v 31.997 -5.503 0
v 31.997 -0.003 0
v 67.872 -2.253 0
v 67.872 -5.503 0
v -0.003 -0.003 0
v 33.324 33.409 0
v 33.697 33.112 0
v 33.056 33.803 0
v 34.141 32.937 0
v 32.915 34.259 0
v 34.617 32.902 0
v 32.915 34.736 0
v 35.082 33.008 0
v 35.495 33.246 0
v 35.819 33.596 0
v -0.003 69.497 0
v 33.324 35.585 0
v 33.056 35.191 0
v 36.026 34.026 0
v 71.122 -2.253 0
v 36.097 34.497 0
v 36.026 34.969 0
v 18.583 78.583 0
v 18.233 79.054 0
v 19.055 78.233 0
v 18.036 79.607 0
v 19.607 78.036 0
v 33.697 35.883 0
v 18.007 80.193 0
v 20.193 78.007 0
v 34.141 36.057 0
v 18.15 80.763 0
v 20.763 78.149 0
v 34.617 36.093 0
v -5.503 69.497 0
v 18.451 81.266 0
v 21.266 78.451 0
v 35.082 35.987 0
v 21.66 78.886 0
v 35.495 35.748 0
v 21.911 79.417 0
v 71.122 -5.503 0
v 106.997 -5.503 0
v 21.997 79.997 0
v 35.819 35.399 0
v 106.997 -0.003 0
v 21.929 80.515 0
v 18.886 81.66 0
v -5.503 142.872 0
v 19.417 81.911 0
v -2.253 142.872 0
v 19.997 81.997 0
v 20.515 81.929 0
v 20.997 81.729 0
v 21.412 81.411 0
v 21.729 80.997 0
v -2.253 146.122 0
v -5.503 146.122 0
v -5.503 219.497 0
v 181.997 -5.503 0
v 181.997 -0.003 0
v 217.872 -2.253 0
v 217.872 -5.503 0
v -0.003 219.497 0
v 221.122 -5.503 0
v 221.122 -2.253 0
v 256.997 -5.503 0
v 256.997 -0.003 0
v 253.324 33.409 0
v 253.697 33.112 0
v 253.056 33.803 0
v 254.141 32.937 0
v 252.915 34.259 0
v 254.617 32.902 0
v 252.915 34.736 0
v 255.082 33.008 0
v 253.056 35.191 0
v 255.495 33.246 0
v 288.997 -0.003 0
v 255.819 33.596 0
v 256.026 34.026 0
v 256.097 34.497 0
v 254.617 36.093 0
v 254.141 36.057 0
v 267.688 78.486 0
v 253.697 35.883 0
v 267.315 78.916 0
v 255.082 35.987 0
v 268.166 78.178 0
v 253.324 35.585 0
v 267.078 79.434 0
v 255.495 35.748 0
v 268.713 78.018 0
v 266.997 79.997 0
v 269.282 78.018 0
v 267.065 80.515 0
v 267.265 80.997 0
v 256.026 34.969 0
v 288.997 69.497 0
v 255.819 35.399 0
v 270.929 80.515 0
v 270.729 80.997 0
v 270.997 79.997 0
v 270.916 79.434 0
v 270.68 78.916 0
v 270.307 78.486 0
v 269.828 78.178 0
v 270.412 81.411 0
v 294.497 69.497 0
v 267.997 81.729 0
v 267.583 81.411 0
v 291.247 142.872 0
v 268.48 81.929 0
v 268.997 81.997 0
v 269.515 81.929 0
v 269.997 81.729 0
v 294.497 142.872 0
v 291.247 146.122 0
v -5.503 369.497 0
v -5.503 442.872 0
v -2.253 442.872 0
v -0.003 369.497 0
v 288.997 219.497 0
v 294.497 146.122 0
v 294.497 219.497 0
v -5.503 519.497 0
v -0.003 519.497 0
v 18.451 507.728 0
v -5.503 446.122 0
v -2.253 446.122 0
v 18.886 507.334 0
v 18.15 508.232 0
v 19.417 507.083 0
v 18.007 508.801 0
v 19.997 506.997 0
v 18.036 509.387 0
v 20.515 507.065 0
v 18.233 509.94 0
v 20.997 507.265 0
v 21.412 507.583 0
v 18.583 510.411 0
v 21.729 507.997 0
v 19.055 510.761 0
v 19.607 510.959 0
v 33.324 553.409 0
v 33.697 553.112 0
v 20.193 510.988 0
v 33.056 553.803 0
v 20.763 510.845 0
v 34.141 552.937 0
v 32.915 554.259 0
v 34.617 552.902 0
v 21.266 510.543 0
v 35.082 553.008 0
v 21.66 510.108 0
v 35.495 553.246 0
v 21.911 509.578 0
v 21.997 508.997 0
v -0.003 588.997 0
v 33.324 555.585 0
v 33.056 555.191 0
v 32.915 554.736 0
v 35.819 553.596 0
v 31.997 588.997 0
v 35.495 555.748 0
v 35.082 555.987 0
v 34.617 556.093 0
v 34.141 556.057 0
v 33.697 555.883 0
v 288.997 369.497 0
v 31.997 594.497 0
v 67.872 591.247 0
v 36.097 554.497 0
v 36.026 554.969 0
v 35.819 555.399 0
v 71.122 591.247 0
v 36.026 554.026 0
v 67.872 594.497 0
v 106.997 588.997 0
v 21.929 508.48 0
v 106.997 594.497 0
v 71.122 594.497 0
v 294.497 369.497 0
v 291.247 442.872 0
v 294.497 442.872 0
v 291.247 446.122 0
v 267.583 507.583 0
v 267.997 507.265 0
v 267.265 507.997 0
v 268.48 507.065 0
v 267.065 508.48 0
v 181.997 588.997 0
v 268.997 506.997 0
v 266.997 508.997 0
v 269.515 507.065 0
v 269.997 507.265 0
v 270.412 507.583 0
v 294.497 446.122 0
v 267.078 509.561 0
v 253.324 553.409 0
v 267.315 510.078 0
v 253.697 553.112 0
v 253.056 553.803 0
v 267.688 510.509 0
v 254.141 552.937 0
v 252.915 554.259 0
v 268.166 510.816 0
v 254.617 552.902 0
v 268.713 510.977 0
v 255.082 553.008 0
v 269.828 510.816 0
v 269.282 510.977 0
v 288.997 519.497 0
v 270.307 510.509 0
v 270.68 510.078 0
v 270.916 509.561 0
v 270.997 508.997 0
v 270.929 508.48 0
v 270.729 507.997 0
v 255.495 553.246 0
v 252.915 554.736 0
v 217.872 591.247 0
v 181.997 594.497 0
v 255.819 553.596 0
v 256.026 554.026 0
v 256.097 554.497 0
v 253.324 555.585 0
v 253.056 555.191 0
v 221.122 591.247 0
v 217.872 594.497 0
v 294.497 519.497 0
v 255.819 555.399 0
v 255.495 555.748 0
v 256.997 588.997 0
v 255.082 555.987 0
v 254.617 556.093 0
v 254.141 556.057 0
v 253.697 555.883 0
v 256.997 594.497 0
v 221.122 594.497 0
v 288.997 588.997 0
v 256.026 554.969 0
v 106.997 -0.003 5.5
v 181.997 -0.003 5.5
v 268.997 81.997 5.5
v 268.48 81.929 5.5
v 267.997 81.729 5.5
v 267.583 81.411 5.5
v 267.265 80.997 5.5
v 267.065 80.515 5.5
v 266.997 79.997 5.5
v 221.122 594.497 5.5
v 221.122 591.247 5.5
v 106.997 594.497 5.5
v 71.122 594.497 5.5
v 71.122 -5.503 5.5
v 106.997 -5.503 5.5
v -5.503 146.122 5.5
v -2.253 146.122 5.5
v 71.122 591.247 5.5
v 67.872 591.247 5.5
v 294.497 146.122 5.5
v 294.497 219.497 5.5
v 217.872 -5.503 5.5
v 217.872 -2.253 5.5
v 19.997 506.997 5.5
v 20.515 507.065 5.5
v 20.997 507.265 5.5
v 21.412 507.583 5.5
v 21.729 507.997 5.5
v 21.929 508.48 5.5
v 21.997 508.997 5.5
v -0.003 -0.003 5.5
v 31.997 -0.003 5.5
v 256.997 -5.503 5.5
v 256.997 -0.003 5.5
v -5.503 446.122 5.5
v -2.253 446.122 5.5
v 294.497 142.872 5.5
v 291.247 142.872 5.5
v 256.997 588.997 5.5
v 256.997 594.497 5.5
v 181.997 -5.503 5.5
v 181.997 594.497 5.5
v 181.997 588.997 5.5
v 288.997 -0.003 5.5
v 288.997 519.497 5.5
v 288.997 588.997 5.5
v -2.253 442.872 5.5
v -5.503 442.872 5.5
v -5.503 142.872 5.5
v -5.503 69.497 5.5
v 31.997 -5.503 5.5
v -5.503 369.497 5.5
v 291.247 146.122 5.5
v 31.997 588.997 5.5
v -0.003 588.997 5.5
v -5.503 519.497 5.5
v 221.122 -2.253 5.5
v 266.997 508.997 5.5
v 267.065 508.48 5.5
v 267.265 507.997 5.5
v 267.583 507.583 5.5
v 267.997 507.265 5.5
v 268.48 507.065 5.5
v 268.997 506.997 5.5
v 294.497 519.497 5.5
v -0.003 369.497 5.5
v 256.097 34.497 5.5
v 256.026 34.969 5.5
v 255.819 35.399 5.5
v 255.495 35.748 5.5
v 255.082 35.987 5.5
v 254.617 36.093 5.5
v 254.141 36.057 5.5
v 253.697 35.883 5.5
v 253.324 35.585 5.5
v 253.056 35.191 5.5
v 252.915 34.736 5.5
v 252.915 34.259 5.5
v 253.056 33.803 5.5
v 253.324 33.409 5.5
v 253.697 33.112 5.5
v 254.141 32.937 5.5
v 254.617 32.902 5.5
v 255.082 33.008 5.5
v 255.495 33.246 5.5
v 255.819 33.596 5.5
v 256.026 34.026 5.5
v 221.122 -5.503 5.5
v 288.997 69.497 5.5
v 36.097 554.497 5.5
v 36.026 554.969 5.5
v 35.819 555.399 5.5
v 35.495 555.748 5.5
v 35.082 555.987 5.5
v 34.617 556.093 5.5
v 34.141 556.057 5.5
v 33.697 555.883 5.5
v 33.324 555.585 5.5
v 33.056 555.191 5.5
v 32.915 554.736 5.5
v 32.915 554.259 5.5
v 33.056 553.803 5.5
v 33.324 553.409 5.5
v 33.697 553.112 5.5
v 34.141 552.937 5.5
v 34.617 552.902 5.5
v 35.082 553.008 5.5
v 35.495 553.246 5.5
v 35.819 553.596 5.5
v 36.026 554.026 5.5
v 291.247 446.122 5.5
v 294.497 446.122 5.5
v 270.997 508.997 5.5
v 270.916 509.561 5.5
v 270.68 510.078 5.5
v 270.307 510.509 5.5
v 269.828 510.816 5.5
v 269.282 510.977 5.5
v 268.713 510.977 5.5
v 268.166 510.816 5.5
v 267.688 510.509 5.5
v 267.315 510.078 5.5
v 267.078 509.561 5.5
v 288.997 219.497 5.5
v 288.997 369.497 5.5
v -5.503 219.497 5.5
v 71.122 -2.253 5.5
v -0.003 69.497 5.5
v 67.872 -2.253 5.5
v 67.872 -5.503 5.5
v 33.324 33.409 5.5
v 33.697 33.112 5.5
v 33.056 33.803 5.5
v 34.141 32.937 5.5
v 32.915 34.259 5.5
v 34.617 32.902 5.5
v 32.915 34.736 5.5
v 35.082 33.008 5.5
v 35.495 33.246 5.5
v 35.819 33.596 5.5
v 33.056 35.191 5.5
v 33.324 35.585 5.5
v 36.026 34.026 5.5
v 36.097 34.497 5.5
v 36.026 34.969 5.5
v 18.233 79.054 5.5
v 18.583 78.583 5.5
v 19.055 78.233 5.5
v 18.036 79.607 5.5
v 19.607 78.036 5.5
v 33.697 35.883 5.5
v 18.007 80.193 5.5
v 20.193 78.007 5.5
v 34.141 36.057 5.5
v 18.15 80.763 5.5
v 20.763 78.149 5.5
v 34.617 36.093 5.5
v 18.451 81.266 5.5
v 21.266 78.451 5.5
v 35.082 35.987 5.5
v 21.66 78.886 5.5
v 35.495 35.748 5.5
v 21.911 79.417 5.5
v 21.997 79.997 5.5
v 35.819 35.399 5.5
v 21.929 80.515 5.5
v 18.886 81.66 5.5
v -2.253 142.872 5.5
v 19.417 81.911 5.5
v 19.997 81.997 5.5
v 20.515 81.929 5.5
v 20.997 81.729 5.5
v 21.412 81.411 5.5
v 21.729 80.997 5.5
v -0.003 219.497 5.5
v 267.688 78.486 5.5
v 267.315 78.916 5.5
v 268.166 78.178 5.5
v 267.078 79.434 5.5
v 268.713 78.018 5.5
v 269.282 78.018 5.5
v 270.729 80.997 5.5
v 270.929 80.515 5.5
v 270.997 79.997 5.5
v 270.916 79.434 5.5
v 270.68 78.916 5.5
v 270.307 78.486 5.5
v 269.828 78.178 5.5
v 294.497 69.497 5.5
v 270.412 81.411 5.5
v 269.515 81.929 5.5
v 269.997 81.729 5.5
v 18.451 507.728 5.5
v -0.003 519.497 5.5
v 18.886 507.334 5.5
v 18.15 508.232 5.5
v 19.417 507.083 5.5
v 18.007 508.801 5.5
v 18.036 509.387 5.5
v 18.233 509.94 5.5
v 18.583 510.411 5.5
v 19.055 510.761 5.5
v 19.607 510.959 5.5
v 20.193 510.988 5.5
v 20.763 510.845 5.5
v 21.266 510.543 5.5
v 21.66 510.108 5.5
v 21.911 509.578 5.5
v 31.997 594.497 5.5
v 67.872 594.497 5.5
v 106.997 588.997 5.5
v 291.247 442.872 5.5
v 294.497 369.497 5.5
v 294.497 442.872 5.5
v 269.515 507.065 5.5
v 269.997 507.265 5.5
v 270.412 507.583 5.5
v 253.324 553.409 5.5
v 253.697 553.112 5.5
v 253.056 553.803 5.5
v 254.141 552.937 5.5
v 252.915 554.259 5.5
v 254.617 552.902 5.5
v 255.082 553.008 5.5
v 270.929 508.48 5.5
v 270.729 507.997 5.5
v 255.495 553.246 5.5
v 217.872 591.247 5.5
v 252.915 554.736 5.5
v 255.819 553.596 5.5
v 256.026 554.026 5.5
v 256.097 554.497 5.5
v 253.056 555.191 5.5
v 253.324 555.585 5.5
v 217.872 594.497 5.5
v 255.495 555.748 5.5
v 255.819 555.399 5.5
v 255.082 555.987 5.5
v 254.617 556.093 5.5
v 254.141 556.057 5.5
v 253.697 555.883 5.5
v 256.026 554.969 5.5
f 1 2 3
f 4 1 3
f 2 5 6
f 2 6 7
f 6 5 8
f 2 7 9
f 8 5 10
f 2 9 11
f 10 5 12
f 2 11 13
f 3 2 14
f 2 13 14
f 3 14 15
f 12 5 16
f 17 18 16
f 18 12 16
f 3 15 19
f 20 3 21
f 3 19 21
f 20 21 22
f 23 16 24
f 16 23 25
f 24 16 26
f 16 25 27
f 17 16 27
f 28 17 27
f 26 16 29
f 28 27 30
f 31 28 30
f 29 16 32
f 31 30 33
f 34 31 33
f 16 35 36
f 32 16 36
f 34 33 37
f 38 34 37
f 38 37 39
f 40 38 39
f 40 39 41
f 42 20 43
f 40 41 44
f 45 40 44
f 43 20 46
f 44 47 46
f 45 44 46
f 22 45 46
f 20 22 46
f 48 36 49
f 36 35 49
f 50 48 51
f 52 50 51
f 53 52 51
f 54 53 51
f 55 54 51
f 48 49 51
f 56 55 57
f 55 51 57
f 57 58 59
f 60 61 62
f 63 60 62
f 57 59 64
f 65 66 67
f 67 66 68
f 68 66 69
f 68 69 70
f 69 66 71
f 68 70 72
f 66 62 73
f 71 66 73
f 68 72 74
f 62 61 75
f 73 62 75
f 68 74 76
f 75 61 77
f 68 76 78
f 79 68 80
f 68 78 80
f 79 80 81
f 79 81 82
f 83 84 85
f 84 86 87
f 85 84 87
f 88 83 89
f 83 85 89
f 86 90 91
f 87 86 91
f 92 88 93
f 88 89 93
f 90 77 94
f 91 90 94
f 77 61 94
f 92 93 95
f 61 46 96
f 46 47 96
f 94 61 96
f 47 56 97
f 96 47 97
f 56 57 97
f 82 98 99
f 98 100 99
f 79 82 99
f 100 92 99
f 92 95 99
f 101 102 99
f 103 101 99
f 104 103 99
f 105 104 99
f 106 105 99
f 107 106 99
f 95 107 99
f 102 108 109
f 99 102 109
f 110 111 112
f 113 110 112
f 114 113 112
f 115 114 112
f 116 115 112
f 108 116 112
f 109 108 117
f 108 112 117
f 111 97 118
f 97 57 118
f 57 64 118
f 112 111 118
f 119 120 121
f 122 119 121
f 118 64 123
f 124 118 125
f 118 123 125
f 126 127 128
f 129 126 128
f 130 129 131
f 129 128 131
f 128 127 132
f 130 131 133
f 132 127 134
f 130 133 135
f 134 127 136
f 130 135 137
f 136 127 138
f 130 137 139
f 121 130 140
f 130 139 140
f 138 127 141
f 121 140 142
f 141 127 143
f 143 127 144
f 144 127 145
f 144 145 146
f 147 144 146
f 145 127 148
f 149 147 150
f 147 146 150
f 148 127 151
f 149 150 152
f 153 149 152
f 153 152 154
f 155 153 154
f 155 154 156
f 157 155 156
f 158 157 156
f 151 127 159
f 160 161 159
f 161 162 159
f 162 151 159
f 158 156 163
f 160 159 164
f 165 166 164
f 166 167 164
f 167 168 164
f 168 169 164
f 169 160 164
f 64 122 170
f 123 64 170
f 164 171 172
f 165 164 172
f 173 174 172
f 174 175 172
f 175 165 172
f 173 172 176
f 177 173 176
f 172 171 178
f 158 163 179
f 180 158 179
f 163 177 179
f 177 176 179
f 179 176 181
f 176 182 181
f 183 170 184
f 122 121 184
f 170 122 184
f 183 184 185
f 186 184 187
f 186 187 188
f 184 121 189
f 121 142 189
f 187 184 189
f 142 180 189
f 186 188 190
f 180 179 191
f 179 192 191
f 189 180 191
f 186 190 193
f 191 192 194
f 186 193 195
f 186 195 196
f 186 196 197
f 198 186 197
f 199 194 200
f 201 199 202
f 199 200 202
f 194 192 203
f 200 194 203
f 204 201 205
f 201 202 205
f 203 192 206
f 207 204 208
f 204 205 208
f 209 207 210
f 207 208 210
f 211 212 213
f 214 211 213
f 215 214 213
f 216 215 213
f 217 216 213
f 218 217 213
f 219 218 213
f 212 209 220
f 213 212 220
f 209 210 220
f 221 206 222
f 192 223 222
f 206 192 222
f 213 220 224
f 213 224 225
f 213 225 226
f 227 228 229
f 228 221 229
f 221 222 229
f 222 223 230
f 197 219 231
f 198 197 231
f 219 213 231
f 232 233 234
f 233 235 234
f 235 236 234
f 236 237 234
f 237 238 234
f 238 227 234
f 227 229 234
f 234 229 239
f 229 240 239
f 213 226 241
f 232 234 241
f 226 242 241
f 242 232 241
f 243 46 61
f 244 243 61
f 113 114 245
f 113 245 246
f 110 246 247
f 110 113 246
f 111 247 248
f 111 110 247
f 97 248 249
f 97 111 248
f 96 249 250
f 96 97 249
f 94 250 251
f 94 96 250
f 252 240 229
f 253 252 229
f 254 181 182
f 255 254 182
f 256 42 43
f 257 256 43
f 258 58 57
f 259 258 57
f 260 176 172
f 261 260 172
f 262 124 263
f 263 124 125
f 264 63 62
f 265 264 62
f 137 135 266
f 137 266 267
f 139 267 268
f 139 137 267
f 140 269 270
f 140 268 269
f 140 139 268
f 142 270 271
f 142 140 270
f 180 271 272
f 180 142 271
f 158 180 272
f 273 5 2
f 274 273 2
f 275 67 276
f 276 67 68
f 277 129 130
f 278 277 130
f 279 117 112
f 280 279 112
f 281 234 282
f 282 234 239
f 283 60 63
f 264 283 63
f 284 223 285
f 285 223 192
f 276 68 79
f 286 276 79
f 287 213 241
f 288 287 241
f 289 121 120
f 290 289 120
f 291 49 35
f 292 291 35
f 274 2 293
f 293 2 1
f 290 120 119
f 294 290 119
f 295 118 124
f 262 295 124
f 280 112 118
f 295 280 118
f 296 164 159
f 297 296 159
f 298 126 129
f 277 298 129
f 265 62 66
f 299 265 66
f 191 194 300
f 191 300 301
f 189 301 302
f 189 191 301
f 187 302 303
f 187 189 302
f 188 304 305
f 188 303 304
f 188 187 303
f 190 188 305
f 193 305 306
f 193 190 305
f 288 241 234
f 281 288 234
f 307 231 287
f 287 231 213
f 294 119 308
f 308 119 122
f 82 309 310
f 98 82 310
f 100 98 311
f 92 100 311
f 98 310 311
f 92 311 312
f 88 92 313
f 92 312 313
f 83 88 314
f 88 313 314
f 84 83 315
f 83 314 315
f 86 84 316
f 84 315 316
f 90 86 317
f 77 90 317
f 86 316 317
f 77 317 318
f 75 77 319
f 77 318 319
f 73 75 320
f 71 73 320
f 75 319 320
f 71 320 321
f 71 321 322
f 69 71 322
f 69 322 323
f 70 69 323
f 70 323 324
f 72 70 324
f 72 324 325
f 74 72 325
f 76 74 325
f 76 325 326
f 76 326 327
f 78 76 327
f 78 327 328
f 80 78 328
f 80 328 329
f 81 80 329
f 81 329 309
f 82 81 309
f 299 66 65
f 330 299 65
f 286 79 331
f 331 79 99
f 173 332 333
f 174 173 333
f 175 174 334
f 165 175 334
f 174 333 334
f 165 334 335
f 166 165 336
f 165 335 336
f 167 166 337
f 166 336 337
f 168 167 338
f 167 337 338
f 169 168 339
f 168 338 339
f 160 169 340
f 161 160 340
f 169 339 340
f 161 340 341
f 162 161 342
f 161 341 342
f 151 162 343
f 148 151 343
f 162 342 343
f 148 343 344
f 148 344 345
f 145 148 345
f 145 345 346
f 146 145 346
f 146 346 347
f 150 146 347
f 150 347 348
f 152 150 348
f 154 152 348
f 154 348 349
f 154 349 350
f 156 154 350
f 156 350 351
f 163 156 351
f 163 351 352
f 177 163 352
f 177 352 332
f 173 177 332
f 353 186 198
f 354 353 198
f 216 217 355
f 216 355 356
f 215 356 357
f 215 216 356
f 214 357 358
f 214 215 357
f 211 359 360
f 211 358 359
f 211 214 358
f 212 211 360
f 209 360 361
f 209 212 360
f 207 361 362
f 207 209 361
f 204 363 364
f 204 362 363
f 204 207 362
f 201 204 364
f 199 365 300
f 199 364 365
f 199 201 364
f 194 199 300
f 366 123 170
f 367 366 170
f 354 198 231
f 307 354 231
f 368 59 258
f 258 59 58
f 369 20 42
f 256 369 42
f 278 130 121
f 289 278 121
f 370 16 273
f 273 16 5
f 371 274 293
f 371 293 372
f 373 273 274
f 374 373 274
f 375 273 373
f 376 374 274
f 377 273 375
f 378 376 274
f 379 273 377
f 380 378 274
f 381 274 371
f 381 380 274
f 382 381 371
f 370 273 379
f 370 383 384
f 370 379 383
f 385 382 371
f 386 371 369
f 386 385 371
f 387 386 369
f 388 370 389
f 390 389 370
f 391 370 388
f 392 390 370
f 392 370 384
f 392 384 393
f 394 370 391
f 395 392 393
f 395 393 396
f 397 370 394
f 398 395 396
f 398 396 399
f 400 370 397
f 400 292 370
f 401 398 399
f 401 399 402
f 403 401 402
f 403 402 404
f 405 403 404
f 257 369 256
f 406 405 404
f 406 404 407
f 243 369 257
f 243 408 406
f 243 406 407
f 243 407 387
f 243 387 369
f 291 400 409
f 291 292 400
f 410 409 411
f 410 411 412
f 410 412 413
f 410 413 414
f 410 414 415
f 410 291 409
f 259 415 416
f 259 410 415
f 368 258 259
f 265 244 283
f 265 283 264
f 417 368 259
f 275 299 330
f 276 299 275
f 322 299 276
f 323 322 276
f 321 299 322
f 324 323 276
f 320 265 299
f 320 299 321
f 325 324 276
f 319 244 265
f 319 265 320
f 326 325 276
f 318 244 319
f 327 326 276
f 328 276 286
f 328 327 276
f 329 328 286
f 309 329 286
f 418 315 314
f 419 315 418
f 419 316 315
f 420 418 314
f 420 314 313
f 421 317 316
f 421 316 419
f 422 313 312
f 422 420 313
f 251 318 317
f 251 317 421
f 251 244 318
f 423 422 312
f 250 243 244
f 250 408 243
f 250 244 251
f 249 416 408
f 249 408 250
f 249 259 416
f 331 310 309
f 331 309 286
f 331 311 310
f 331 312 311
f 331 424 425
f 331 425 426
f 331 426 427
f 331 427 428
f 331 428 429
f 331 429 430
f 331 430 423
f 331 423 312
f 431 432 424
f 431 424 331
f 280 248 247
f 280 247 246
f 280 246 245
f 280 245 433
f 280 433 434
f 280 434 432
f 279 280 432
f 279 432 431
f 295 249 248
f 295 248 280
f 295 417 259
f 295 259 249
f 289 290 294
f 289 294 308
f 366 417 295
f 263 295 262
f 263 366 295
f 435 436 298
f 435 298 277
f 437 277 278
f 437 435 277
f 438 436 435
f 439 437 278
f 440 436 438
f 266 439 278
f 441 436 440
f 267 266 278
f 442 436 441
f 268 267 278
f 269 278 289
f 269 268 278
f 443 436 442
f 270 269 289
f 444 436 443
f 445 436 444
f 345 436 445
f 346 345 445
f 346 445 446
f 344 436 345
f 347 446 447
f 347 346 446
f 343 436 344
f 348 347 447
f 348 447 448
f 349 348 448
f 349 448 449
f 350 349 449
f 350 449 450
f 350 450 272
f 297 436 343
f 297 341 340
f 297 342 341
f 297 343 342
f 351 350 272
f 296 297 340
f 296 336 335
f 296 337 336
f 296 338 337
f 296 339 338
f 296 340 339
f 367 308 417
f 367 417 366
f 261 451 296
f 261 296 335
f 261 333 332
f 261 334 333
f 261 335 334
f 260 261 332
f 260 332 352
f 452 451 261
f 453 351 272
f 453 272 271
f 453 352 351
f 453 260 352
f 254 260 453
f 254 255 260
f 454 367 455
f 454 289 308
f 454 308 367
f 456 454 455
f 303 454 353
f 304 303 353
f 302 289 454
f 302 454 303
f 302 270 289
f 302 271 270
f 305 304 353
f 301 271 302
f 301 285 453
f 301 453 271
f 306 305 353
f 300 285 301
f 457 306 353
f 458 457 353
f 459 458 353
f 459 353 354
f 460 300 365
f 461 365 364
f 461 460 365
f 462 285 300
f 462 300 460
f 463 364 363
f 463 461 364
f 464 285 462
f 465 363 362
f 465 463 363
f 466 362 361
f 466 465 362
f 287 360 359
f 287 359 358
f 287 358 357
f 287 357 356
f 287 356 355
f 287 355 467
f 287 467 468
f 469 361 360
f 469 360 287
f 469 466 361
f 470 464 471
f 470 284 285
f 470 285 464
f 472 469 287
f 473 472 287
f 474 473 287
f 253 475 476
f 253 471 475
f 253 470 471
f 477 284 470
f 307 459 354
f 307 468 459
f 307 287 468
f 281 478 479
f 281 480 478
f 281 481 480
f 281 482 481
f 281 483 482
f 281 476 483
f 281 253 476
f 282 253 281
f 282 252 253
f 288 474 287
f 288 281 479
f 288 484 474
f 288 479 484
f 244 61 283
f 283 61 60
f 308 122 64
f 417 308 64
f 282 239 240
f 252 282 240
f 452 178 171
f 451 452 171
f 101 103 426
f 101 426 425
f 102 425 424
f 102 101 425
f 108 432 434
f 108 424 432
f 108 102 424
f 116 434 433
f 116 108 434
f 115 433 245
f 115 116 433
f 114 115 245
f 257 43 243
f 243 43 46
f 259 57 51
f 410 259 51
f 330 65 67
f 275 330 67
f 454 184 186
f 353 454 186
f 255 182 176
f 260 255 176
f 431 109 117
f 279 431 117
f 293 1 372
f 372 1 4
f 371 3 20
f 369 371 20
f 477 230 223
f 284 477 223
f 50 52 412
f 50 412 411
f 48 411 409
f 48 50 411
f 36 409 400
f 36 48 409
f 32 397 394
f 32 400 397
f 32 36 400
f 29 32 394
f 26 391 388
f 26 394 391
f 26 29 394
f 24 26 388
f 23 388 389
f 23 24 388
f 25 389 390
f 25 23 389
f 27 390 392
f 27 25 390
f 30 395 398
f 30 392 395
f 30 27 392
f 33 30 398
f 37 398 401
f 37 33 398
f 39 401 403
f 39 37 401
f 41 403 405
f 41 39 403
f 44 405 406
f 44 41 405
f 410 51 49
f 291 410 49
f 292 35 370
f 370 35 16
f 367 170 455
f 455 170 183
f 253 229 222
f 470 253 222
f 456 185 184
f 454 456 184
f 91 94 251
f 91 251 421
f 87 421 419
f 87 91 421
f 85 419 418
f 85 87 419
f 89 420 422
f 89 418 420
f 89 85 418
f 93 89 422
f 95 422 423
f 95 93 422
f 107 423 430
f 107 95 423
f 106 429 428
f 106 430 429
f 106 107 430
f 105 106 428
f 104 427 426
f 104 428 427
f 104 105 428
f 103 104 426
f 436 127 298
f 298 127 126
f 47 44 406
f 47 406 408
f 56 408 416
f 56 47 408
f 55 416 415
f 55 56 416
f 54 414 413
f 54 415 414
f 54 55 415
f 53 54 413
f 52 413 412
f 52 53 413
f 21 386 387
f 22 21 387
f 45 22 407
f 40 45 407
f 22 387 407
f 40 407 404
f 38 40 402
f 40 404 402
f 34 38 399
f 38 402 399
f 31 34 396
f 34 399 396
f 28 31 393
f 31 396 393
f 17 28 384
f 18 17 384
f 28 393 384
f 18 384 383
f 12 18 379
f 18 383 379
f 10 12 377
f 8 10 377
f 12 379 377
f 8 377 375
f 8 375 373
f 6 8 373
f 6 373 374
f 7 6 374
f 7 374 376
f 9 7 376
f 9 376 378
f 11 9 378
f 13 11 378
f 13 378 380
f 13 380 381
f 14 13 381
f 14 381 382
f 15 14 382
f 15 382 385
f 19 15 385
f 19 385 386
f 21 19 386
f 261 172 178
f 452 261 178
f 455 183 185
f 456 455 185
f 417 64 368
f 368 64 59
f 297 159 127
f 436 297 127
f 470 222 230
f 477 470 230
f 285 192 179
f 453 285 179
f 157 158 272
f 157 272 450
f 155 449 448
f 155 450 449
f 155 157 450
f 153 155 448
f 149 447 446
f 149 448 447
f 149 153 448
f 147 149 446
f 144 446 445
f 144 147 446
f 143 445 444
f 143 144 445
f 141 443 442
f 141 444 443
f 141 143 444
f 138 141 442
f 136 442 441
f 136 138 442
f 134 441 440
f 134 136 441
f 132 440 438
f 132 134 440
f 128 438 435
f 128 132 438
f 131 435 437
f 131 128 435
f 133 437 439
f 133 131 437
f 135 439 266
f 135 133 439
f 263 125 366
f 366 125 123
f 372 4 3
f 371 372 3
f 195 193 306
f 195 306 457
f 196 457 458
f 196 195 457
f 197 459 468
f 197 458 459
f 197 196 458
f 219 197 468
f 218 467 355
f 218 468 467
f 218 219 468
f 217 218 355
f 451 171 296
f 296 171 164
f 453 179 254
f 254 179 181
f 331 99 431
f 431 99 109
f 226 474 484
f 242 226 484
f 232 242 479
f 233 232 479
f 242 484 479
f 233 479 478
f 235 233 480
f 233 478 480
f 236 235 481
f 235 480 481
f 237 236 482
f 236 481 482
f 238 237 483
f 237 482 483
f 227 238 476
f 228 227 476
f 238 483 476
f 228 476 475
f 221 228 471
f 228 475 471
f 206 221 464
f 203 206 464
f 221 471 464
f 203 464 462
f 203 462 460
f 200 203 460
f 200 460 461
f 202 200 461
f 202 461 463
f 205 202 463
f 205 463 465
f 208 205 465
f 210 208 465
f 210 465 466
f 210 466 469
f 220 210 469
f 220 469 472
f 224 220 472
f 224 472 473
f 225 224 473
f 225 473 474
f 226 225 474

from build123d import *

# Parameters (mm, degrees)
BOSS_EXTRUDE1_DEPTH     = 5.5
CUT_EXTRUDE1_DEPTH      = 664.465030112
CUT_EXTRUDE1_DEPTH_BACK = 664.465030112
SKETCH3_R               = 1.6
CUT_EXTRUDE2_DEPTH      = 664.465030112


with BuildPart() as part:
    # Sketch1 → Boss-Extrude1 (new body)
    with BuildSketch(Plane.XY):
        Polygon((-0.002685186, 588.997205838), (-0.002685186, 519.497205838), (-5.502685186, 519.497205838), (-5.502685186, 446.122205838), (-2.252685186, 446.122205838), (-2.252685186, 444.497205838), (-2.252685186, 442.872205838), (-5.502685186, 442.872205838), (-5.502685186, 369.497205838), (-0.002685186, 369.497205838), (-0.002685186, 219.497205838), (-5.502685186, 219.497205838), (-5.502685186, 146.122205838), (-2.252685186, 146.122205838), (-2.252685186, 144.497205838), (-2.252685186, 142.872205838), (-5.502685186, 142.872205838), (-5.502685186, 69.497205838), (-0.002685186, 69.497205838), (-0.002685186, -0.002794162), (31.997314814, -0.002794162), (31.997314814, -5.502794162), (67.872314814, -5.502794162), (67.872314814, -2.252794162), (69.497314814, -2.252794162), (71.122314814, -2.252794162), (71.122314814, -5.502794162), (106.997314814, -5.502794162), (106.997314814, -0.002794162), (181.997314814, -0.002794162), (181.997314814, -5.502794162), (217.872314814, -5.502794162), (217.872314814, -2.252794162), (219.497314814, -2.252794162), (221.122314814, -2.252794162), (221.122314814, -5.502794162), (256.997314814, -5.502794162), (256.997314814, -0.002794162), (288.997314814, -0.002794162), (288.997314814, 69.497205838), (294.497314814, 69.497205838), (294.497314814, 142.872205838), (291.247314814, 142.872205838), (291.247314814, 144.497205838), (291.247314814, 146.122205838), (294.497314814, 146.122205838), (294.497314814, 219.497205838), (288.997314814, 219.497205838), (288.997314814, 369.497205838), (294.497314814, 369.497205838), (294.497314814, 442.872205838), (291.247314814, 442.872205838), (291.247314814, 444.497205838), (291.247314814, 446.122205838), (294.497314814, 446.122205838), (294.497314814, 519.497205838), (288.997314814, 519.497205838), (288.997314814, 588.997205838), (256.997314814, 588.997205838), (256.997314814, 594.497205838), (221.122314814, 594.497205838), (221.122314814, 591.247205838), (219.497314814, 591.247205838), (217.872314814, 591.247205838), (217.872314814, 594.497205838), (181.997314814, 594.497205838), (181.997314814, 588.997205838), (106.997314814, 588.997205838), (106.997314814, 594.497205838), (71.122314814, 594.497205838), (71.122314814, 591.247205838), (69.497314814, 591.247205838), (67.872314814, 591.247205838), (67.872314814, 594.497205838), (31.997314814, 594.497205838), (31.997314814, 588.997205838), align=None)
    extrude(amount=BOSS_EXTRUDE1_DEPTH)

    # Sketch2 → Cut-Extrude1 (cut, two sides: drawn at the far end of the back side and taken through both)
    with BuildSketch(Plane.XY.offset(-CUT_EXTRUDE1_DEPTH_BACK)):
        with BuildLine():
            ThreePointArc((270.997314814, 508.997205838), (268.997314814, 510.997205838), (266.997314814, 508.997205838))
            Line((266.997314814, 508.997205838), (268.997314814, 508.997205838))
            Line((268.997314814, 508.997205838), (268.997314814, 506.997205838))
            ThreePointArc((268.997314814, 506.997205838), (270.411528376, 507.582992276), (270.997314814, 508.997205838))
        make_face()
        with BuildLine():
            Line((268.997314814, 508.997205838), (266.997314814, 508.997205838))
            ThreePointArc((266.997314814, 508.997205838), (267.583101251, 507.582992276), (268.997314814, 506.997205838))
            Line((268.997314814, 506.997205838), (268.997314814, 508.997205838))
        make_face()
        with BuildLine():
            Line((19.997314814, 506.997205838), (19.997314814, 508.997205838))
            Line((19.997314814, 508.997205838), (21.997314814, 508.997205838))
            ThreePointArc((21.997314814, 508.997205838), (18.583101251, 510.4114194), (19.997314814, 506.997205838))
        make_face()
        with BuildLine():
            Line((21.997314814, 508.997205838), (19.997314814, 508.997205838))
            Line((19.997314814, 508.997205838), (19.997314814, 506.997205838))
            ThreePointArc((19.997314814, 506.997205838), (21.411528376, 507.582992276), (21.997314814, 508.997205838))
        make_face()
        with BuildLine():
            ThreePointArc((21.997314814, 79.997205838), (21.411528376, 81.4114194), (19.997314814, 81.997205838))
            Line((19.997314814, 81.997205838), (19.997314814, 79.997205838))
            Line((19.997314814, 79.997205838), (21.997314814, 79.997205838))
        make_face()
        with BuildLine():
            Line((19.997314814, 79.997205838), (19.997314814, 81.997205838))
            ThreePointArc((19.997314814, 81.997205838), (18.583101251, 78.582992276), (21.997314814, 79.997205838))
            Line((21.997314814, 79.997205838), (19.997314814, 79.997205838))
        make_face()
        with BuildLine():
            ThreePointArc((270.997314814, 79.997205838), (270.411528376, 81.4114194), (268.997314814, 81.997205838))
            Line((268.997314814, 81.997205838), (268.997314814, 79.997205838))
            Line((268.997314814, 79.997205838), (266.997314814, 79.997205838))
            ThreePointArc((266.997314814, 79.997205838), (268.997314814, 77.997205838), (270.997314814, 79.997205838))
        make_face()
        with BuildLine():
            Line((268.997314814, 79.997205838), (268.997314814, 81.997205838))
            ThreePointArc((268.997314814, 81.997205838), (267.583101251, 81.4114194), (266.997314814, 79.997205838))
            Line((266.997314814, 79.997205838), (268.997314814, 79.997205838))
        make_face()
    extrude(amount=CUT_EXTRUDE1_DEPTH + CUT_EXTRUDE1_DEPTH_BACK, mode=Mode.SUBTRACT)

    # Sketch3 → Cut-Extrude2 (cut, through all)
    with BuildSketch(Plane.XY.offset(5.5)):
        with Locations((34.497314814, 554.497205838)):
            Circle(SKETCH3_R)
        with Locations((254.497314814, 554.497205838)):
            Circle(SKETCH3_R)
        with Locations((34.497314814, 34.497205838)):
            Circle(SKETCH3_R)
        with Locations((254.497314814, 34.497205838)):
            Circle(SKETCH3_R)
    extrude(amount=-CUT_EXTRUDE2_DEPTH, mode=Mode.SUBTRACT)


solid = part.part
